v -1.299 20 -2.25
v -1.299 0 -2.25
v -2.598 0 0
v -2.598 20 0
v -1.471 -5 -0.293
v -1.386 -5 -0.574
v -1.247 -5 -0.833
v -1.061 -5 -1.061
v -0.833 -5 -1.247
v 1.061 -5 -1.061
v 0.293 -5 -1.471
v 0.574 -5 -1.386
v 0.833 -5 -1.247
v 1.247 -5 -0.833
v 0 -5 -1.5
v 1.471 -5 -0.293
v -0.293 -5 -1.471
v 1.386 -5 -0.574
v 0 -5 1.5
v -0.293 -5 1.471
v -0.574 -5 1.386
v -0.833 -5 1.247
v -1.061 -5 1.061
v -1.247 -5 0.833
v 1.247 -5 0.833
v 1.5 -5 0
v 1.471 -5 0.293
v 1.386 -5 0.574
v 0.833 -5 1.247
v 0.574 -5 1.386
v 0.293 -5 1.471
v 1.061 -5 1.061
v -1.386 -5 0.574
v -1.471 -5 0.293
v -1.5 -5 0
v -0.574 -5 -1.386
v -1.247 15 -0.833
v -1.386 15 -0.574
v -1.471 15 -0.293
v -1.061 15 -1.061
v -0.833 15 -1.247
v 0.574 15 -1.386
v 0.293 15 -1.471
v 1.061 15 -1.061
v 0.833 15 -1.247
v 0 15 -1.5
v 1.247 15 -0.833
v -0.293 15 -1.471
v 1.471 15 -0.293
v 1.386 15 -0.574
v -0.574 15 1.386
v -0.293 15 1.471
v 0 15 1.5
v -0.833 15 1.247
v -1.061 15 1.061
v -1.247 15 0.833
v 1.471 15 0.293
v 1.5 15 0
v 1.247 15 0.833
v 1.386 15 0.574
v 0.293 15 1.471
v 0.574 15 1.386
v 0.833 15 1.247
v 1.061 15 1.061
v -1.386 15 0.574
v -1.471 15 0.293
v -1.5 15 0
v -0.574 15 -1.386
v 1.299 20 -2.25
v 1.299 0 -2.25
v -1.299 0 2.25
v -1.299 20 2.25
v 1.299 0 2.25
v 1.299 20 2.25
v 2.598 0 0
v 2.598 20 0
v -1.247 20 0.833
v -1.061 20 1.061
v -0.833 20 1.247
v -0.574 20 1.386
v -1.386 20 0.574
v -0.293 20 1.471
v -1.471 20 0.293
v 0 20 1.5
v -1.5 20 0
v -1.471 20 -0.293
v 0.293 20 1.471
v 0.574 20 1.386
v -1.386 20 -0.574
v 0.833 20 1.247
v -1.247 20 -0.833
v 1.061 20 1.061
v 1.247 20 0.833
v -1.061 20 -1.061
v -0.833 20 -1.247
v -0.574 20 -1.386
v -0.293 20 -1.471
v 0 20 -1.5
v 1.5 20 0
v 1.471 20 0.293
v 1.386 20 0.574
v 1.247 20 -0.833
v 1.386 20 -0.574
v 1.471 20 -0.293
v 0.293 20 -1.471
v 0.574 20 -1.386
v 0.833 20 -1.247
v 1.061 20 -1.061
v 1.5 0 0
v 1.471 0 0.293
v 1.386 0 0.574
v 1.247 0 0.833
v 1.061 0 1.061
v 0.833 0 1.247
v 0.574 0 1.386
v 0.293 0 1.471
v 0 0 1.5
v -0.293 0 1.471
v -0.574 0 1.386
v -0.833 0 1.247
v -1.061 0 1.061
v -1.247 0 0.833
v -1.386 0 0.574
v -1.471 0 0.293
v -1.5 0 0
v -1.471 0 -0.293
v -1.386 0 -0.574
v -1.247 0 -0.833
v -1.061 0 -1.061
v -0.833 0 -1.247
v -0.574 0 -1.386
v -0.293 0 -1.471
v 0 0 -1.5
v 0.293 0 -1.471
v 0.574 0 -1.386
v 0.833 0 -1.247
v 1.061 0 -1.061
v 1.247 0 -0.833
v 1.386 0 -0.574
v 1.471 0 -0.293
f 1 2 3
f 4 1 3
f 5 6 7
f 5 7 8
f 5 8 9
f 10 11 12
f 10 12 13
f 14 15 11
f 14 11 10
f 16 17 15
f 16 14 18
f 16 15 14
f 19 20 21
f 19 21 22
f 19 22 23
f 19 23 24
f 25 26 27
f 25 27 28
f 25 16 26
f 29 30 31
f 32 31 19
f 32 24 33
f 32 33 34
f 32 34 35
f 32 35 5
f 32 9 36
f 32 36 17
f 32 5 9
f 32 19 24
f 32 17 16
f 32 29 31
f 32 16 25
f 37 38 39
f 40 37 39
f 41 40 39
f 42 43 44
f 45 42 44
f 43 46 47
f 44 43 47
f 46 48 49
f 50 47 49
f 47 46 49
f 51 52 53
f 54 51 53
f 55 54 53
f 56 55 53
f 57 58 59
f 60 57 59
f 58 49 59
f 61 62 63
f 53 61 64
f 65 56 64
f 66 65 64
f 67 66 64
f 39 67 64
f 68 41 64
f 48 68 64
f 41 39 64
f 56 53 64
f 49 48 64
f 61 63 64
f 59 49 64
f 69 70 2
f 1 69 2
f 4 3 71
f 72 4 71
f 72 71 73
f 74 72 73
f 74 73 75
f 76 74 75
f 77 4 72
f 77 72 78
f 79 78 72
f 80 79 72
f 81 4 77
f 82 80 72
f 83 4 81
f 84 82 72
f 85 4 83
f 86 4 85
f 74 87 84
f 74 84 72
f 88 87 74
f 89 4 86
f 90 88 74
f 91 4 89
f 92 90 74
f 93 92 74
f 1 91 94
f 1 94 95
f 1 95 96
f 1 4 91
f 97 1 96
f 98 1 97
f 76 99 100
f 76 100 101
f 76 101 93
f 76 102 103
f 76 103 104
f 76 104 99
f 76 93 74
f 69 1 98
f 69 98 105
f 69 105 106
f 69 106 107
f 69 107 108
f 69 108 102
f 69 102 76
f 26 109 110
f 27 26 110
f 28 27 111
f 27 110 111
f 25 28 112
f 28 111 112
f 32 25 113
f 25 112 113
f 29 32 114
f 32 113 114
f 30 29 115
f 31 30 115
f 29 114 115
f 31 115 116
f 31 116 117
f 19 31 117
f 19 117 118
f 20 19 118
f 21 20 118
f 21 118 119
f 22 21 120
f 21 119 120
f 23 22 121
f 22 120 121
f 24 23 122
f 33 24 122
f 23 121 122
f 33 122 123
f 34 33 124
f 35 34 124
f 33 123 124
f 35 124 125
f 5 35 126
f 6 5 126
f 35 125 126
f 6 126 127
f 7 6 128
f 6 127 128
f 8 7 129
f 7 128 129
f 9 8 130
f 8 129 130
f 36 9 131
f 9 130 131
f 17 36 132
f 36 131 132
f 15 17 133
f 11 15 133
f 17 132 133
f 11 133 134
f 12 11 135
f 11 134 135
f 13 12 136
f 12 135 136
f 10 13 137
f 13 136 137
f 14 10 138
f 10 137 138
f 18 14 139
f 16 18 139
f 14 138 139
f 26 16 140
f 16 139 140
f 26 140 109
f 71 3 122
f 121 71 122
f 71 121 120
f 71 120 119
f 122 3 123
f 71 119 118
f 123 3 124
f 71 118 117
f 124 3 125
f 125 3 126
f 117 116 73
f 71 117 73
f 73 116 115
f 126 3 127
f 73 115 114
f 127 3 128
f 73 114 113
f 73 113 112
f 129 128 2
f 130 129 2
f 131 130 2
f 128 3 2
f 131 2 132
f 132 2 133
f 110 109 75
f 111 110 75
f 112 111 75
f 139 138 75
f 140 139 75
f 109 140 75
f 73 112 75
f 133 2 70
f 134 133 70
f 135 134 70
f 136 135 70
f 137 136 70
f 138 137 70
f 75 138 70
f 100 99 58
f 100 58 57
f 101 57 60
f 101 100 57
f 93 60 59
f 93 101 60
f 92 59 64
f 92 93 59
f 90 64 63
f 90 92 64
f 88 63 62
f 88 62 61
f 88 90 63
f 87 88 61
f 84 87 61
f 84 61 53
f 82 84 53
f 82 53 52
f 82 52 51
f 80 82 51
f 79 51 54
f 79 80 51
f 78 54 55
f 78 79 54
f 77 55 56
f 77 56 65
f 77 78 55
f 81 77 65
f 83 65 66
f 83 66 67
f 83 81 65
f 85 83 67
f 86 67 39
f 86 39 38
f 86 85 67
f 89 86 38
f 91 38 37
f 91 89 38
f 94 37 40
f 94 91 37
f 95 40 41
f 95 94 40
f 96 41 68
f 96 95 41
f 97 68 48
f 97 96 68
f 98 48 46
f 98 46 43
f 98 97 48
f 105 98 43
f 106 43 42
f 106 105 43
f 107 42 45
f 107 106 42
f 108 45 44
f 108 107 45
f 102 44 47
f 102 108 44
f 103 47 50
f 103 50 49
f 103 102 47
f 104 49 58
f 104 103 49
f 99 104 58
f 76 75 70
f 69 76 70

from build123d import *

# Parameters (mm, degrees)
BOSS_EXTRUDE1_DEPTH = 20
SKETCH2_R           = 1.5
BOSS_EXTRUDE2_DEPTH = 5
CUT_EXTRUDE1_START  = -20
SKETCH2_2_R         = 1.5
CUT_EXTRUDE1_DEPTH  = 5


with BuildPart() as part:
    # Sketch1 → Boss-Extrude1 (new body)
    with BuildSketch(Plane(origin=(0, 0, 0), x_dir=(1, 0, 0), z_dir=(0, 1, 0))):
        Polygon((2.598076211, 0), (1.299038106, 2.25), (-1.299038106, 2.25), (-2.598076211, 0), (-1.299038106, -2.25), (1.299038106, -2.25), align=None)
    extrude(amount=BOSS_EXTRUDE1_DEPTH)

    # Sketch2 → Boss-Extrude2 (add)
    with BuildSketch(Plane.XZ):
        Circle(SKETCH2_R)
    extrude(amount=BOSS_EXTRUDE2_DEPTH)

    # Sketch2<2> → Cut-Extrude1 (cut)
    with BuildSketch(Plane.XZ.offset(CUT_EXTRUDE1_START)):
        Circle(SKETCH2_2_R)
    extrude(amount=CUT_EXTRUDE1_DEPTH, mode=Mode.SUBTRACT)


solid = part.part
